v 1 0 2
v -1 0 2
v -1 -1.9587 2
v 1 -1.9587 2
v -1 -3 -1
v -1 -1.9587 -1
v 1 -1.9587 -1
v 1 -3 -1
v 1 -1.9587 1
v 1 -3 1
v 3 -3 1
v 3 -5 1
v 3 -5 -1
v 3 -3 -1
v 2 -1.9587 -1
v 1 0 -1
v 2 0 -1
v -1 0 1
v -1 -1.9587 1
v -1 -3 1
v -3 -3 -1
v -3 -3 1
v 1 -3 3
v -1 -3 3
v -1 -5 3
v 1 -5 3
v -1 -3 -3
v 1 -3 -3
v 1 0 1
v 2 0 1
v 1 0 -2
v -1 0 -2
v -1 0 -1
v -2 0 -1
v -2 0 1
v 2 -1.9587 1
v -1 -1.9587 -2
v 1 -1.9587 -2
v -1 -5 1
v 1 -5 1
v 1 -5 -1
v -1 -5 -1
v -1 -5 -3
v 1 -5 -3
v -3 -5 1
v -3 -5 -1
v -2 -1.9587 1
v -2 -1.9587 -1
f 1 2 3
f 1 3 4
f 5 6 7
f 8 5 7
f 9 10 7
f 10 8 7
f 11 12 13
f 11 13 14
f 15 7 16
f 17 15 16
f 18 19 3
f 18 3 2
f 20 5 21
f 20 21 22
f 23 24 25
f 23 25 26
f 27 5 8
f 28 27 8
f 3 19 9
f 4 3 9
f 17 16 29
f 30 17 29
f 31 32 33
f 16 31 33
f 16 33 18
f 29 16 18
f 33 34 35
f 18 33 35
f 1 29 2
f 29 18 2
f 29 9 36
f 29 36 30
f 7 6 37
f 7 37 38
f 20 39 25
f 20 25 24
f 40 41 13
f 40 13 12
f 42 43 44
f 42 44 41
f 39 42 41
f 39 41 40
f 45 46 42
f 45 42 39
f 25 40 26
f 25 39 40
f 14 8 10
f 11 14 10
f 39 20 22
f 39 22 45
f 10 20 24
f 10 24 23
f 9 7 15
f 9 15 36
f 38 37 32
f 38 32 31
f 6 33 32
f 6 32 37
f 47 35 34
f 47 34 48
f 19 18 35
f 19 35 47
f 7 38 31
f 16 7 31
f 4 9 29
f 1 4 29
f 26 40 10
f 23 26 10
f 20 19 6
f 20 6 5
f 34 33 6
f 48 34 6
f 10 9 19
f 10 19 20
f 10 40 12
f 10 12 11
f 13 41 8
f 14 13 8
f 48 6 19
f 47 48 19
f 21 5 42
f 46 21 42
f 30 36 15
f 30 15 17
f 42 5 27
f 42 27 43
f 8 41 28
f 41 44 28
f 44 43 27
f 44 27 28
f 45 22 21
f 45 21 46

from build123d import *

# Parameters (mm, degrees)
F0_W      = 2
F0_H      = 2
F1_DEPTH  = 5
F2_W      = 2
F2_H      = 2
F3_DEPTH  = 2
F4_W      = 2
F4_H      = 1.958706
F5_DEPTH  = 1
F6_W      = 1.958706
F6_H      = 2
F7_DEPTH  = 1
F8_W      = 2
F8_H      = 2
F9_DEPTH  = 2
F10_W     = 2
F10_H     = 2
F11_DEPTH = 2
F12_W     = 2
F12_H     = 1.958706
F13_DEPTH = 1
F14_W     = 2
F14_H     = 2
F15_DEPTH = 2
F16_W     = 1.958706
F16_H     = 2
F17_DEPTH = 1


with BuildPart() as f1:
    # F0 (on Front) → F1 (new body)
    with BuildSketch(Plane.XZ):
        Rectangle(F0_W, F0_H)
    extrude(amount=F1_DEPTH)

    # F2 (on face) → F3 (join)
    with BuildSketch(Plane(origin=(0, 0, -1), x_dir=(1, 0, 0), z_dir=(0, 0, -1))):
        with Locations((0, 4)):
            Rectangle(F2_W, F2_H)
    extrude(amount=F3_DEPTH)

    # F4 (on face) → F5 (join)
    with BuildSketch(Plane(origin=(0, 0, -1), x_dir=(1, 0, 0), z_dir=(0, 0, -1))):
        with Locations((0, 0.979353)):
            Rectangle(F4_W, F4_H)
    extrude(amount=F5_DEPTH)

    # F6 (on face) → F7 (join)
    with BuildSketch(Plane(origin=(-1, 0, 0), x_dir=(0, -1, 0), z_dir=(-1, 0, 0))):
        with Locations((0.979353, 0)):
            Rectangle(F6_W, F6_H)
    extrude(amount=F7_DEPTH)

    # F8 (on face) → F9 (join)
    with BuildSketch(Plane(origin=(-1, 0, 0), x_dir=(0, -1, 0), z_dir=(-1, 0, 0))):
        with Locations((4, 0)):
            Rectangle(F8_W, F8_H)
    extrude(amount=F9_DEPTH)

    # F10 (on face) → F11 (join)
    with BuildSketch(Plane.XY.offset(1)):
        with Locations((0, -4)):
            Rectangle(F10_W, F10_H)
    extrude(amount=F11_DEPTH)

    # F12 (on face) → F13 (join)
    with BuildSketch(Plane.XY.offset(1)):
        with Locations((0, -0.979353)):
            Rectangle(F12_W, F12_H)
    extrude(amount=F13_DEPTH)

    # F14 (on face) → F15 (join)
    with BuildSketch(Plane.YZ.offset(1)):
        with Locations((-4, 0)):
            Rectangle(F14_W, F14_H)
    extrude(amount=F15_DEPTH)

    # F16 (on face) → F17 (join)
    with BuildSketch(Plane.YZ.offset(1)):
        with Locations((-0.979353, 0)):
            Rectangle(F16_W, F16_H)
    extrude(amount=F17_DEPTH)


solid = f1.part
